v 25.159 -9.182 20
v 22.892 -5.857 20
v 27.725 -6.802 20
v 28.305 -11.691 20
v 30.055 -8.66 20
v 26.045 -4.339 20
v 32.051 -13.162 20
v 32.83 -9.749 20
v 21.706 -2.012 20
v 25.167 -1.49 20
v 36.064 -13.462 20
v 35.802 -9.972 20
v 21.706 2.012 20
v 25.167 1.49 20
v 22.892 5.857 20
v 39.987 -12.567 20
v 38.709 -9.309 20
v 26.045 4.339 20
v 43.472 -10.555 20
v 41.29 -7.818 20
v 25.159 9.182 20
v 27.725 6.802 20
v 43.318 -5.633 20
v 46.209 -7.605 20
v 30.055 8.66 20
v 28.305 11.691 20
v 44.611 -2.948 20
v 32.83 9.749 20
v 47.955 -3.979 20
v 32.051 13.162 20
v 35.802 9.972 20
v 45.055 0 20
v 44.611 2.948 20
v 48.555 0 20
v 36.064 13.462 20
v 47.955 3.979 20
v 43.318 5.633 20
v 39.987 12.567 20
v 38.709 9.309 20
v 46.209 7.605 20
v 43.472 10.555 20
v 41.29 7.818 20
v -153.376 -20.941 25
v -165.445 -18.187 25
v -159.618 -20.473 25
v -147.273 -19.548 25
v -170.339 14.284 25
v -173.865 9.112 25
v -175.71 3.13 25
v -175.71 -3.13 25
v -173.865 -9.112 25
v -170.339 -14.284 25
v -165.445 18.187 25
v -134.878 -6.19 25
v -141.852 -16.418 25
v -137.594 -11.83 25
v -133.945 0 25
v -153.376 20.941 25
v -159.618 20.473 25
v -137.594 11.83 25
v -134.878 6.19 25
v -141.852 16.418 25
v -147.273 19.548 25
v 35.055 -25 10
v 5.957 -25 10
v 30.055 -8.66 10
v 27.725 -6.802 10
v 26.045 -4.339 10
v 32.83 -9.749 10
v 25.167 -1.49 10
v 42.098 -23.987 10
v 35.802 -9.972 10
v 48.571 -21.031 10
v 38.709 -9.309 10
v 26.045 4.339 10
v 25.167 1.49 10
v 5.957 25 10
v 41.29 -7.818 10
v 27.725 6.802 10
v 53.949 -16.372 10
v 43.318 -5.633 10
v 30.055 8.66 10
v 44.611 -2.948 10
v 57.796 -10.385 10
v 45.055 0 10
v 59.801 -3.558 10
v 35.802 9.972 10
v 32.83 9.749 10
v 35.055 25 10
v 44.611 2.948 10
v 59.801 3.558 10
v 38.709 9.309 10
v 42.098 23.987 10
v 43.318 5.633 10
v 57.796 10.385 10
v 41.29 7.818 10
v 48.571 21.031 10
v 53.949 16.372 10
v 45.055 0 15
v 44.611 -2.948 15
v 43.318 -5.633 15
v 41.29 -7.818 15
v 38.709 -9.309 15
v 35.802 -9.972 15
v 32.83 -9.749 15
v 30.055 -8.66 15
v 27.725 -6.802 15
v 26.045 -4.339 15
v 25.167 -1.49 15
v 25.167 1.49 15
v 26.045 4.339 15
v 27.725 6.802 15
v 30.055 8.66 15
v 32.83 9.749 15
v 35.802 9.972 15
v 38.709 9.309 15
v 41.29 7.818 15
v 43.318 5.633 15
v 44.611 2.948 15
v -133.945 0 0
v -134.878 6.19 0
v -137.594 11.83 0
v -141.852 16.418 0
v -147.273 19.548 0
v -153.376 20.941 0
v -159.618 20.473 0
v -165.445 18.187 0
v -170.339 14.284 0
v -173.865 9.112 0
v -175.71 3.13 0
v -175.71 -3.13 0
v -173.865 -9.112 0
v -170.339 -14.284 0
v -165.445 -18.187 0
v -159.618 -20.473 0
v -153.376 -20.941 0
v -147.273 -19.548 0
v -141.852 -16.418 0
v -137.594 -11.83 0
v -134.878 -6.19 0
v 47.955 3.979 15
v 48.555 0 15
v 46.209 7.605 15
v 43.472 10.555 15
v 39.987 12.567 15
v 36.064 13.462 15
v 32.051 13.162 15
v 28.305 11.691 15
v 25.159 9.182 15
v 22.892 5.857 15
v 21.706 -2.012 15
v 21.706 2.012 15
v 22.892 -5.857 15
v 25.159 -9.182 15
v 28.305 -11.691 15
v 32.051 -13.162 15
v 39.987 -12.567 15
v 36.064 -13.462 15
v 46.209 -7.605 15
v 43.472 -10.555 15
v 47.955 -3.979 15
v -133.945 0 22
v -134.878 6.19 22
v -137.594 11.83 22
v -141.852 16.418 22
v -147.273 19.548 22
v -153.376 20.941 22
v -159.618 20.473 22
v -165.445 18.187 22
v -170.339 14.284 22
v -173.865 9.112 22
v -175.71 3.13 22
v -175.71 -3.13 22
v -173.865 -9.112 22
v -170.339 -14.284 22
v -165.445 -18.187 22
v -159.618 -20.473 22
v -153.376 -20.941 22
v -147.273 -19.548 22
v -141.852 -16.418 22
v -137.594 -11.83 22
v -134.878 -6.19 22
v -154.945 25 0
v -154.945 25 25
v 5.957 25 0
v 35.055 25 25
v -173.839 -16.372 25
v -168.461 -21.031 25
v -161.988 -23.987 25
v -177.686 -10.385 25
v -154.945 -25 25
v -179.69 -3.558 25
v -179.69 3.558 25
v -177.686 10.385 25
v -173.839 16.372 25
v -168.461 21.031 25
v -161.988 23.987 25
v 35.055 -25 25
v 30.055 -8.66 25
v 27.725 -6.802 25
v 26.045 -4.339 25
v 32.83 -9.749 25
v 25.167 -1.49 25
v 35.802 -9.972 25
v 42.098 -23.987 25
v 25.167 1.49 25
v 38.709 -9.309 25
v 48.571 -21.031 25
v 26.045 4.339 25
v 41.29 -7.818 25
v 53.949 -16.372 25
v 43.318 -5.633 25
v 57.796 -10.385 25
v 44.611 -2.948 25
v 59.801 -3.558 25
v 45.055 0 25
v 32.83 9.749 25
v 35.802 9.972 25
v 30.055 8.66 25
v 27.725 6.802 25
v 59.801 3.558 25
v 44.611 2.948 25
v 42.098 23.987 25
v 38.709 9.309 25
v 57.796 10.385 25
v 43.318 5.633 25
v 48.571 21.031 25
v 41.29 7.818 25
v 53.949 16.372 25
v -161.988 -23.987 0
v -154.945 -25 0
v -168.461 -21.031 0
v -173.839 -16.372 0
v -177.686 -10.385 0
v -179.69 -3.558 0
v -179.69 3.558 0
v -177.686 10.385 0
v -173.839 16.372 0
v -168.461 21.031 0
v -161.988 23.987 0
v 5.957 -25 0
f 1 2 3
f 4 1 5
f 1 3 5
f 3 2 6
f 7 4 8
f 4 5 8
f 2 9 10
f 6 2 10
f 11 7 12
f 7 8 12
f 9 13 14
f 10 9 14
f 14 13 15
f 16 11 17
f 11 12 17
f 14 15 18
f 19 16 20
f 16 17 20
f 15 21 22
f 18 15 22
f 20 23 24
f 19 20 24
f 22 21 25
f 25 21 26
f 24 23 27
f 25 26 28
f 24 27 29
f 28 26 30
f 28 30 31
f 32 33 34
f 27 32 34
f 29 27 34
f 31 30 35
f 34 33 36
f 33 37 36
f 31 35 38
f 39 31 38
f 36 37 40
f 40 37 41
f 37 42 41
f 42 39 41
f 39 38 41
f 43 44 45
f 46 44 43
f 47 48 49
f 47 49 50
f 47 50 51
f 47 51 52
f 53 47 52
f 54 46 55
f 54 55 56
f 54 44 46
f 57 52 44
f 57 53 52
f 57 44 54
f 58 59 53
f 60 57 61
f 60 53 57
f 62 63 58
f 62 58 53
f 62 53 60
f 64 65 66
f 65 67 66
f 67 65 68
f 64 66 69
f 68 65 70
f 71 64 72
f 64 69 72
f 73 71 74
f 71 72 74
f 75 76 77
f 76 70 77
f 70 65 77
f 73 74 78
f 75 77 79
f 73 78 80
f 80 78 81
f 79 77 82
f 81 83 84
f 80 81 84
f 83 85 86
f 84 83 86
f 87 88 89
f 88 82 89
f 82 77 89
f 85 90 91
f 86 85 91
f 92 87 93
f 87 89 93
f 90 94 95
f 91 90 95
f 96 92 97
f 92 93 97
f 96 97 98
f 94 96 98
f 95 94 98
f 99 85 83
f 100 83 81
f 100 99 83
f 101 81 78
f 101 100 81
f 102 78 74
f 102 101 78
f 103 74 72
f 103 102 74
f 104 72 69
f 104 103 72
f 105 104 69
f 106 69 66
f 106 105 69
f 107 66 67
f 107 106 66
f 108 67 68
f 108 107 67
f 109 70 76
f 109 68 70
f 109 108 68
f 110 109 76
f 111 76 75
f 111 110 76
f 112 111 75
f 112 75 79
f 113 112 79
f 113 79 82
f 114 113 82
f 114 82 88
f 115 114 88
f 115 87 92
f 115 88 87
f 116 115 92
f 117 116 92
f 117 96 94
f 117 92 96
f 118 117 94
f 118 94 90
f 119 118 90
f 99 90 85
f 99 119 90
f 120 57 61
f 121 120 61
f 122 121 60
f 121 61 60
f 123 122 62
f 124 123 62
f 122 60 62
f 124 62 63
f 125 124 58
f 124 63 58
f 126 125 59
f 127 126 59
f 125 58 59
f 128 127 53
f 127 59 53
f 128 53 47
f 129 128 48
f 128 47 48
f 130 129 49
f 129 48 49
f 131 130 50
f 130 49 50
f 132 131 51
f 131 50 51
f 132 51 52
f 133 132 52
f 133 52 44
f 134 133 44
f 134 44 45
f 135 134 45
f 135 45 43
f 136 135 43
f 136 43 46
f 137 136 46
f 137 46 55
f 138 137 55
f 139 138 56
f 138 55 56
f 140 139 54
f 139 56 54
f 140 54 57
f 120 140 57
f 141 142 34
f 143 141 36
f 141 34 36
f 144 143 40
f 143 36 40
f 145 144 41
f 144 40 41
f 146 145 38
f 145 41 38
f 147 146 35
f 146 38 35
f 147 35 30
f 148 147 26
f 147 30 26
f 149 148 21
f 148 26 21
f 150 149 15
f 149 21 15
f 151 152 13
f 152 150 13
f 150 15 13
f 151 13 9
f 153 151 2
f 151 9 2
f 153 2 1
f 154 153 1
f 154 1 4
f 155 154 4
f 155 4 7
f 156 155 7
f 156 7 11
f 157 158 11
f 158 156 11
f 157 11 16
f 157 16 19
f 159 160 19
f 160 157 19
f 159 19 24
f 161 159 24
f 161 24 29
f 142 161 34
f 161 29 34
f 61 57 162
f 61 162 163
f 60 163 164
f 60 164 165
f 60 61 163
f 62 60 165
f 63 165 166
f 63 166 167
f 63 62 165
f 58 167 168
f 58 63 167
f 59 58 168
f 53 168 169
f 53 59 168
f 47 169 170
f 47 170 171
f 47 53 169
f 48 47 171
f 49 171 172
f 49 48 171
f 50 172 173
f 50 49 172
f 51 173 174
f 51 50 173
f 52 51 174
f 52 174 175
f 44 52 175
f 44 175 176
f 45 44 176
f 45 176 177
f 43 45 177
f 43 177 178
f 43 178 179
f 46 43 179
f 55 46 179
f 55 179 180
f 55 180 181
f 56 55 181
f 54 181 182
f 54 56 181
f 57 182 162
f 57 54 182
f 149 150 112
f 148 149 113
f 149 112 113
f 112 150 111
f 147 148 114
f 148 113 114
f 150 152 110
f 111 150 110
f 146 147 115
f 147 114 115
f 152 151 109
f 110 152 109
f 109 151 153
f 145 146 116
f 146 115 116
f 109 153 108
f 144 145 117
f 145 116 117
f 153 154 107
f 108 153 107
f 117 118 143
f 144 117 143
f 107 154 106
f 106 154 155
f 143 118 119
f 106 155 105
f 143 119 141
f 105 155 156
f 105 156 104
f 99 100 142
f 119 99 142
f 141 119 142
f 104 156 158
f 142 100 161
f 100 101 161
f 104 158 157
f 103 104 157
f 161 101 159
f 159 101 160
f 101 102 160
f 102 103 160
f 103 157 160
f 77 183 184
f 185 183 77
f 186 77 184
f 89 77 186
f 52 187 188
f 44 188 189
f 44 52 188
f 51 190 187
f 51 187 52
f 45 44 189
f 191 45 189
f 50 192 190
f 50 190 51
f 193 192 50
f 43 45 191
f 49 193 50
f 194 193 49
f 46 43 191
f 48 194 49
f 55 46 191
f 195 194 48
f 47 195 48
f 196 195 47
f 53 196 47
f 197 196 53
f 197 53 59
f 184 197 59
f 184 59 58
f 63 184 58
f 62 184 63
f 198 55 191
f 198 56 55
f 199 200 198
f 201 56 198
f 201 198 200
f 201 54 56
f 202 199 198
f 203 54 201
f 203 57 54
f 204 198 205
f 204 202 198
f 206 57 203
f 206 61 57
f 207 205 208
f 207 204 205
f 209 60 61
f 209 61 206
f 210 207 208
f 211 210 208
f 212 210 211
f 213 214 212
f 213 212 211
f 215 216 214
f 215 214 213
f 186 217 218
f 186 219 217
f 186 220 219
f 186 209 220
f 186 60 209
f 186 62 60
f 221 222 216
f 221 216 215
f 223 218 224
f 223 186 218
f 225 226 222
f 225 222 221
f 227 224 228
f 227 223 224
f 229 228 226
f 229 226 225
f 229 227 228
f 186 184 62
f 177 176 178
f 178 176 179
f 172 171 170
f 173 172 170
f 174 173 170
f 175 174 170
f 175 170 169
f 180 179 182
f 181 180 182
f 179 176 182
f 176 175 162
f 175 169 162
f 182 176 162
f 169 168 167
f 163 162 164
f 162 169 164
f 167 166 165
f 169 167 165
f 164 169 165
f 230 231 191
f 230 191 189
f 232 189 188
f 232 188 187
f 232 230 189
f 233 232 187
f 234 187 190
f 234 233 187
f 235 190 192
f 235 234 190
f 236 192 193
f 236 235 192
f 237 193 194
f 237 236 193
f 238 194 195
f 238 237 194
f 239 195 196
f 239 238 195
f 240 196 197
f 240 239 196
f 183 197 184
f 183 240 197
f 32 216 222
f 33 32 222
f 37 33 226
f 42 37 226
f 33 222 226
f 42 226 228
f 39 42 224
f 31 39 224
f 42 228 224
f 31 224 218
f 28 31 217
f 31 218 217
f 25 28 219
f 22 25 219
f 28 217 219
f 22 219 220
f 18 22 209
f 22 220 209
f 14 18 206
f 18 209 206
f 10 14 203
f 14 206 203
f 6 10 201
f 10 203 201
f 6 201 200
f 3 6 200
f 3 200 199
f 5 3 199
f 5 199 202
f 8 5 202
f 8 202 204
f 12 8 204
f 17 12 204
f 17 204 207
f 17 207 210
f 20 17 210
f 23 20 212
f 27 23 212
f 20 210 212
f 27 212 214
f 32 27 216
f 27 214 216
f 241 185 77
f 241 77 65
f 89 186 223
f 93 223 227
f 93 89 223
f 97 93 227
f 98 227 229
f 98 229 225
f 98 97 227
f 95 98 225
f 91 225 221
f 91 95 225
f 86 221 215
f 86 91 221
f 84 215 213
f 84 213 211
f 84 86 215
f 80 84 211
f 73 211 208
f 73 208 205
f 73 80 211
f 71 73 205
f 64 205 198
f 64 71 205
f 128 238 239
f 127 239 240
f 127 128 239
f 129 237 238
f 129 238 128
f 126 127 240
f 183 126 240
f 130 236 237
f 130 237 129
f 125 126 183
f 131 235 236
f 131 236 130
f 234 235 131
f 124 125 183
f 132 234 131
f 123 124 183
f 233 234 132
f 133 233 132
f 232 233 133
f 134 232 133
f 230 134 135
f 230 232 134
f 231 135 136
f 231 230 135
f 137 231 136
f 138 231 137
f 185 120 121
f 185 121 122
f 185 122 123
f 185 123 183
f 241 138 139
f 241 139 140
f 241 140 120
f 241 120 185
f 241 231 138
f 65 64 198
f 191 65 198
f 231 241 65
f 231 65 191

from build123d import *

# Parameters (mm, degrees)
BOSS_EXTRUDE1_DEPTH = 25
SKETCH2_R           = 13.5
CUT_EXTRUDE1_DEPTH  = 25
SKETCH3_R           = 21
CUT_EXTRUDE2_DEPTH  = 25
SKETCH4_R           = 13.5
SKETCH4_R_2         = 10
BOSS_EXTRUDE2_DEPTH = 5
BOSS_EXTRUDE3_START = -15
SKETCH5_R           = 13.5
SKETCH5_R_2         = 10
BOSS_EXTRUDE3_DEPTH = 15
CUT_EXTRUDE3_DEPTH  = 10
SKETCH7_R           = 21
BOSS_EXTRUDE4_DEPTH = 3


with BuildPart() as part:
    # Sketch1 → Boss-Extrude1 (new body)
    with BuildSketch(Plane.XY):
        with BuildLine():
            Line((-154.944852941, 25), (35.055147059, 25))
            ThreePointArc((35.055147059, 25), (60.055147059, 0), (35.055147059, -25))
            Line((35.055147059, -25), (-154.944852941, -25))
            ThreePointArc((-154.944852941, -25), (-179.944852941, 0), (-154.944852941, 25))
        make_face()
    extrude(amount=BOSS_EXTRUDE1_DEPTH)

    # Sketch2 → Cut-Extrude1 (cut)
    with BuildSketch(Plane.XY.offset(25)):
        with Locations((35.055147059, 0)):
            Circle(SKETCH2_R)
    extrude(amount=-CUT_EXTRUDE1_DEPTH, mode=Mode.SUBTRACT)

    # Sketch3 → Cut-Extrude2 (cut)
    with BuildSketch(Plane.XY.offset(25)):
        with Locations((-154.944852941, 0)):
            Circle(SKETCH3_R)
    extrude(amount=-CUT_EXTRUDE2_DEPTH, mode=Mode.SUBTRACT)

    # Sketch4 → Boss-Extrude2 (add)
    with BuildSketch(Plane.XY.offset(25)):
        with Locations((35.055147059, 0)):
            Circle(SKETCH4_R)
        with Locations((35.055147059, 0)):
            Circle(SKETCH4_R_2, mode=Mode.SUBTRACT)
    extrude(amount=-BOSS_EXTRUDE2_DEPTH)

    # Sketch5 → Boss-Extrude3 (add)
    with BuildSketch(Plane(origin=(0, 0, 0), x_dir=(-1, 0, 0), z_dir=(0, 0, -1)).offset(BOSS_EXTRUDE3_START)):
        with Locations(Location((-35.055147059, 0, 0), (0, 0, 180))):
            Circle(SKETCH5_R)
        with Locations(Location((-35.055147059, 0, 0), (0, 0, 180))):
            Circle(SKETCH5_R_2, mode=Mode.SUBTRACT)
    extrude(amount=BOSS_EXTRUDE3_DEPTH)

    # Sketch6 → Cut-Extrude3 (cut)
    with BuildSketch(Plane(origin=(0, 0, 0), x_dir=(-1, 0, 0), z_dir=(0, 0, -1))):
        with BuildLine():
            Line((-35.055147059, 25), (-5.957161701, 25))
            Line((-5.957161701, 25), (-5.957161701, -25))
            Line((-5.957161701, -25), (-35.055147059, -25))
            ThreePointArc((-35.055147059, -25), (-60.055147059, 0), (-35.055147059, 25))
        make_face()
    extrude(amount=-CUT_EXTRUDE3_DEPTH, mode=Mode.SUBTRACT)


with BuildPart() as body_2:
    # Sketch7 → Boss-Extrude4 (new body)
    with BuildSketch(Plane.XY.offset(25)):
        with Locations((-154.944852941, 0)):
            Circle(SKETCH7_R)
    extrude(amount=-BOSS_EXTRUDE4_DEPTH)


solid = Compound([part.part, body_2.part])
